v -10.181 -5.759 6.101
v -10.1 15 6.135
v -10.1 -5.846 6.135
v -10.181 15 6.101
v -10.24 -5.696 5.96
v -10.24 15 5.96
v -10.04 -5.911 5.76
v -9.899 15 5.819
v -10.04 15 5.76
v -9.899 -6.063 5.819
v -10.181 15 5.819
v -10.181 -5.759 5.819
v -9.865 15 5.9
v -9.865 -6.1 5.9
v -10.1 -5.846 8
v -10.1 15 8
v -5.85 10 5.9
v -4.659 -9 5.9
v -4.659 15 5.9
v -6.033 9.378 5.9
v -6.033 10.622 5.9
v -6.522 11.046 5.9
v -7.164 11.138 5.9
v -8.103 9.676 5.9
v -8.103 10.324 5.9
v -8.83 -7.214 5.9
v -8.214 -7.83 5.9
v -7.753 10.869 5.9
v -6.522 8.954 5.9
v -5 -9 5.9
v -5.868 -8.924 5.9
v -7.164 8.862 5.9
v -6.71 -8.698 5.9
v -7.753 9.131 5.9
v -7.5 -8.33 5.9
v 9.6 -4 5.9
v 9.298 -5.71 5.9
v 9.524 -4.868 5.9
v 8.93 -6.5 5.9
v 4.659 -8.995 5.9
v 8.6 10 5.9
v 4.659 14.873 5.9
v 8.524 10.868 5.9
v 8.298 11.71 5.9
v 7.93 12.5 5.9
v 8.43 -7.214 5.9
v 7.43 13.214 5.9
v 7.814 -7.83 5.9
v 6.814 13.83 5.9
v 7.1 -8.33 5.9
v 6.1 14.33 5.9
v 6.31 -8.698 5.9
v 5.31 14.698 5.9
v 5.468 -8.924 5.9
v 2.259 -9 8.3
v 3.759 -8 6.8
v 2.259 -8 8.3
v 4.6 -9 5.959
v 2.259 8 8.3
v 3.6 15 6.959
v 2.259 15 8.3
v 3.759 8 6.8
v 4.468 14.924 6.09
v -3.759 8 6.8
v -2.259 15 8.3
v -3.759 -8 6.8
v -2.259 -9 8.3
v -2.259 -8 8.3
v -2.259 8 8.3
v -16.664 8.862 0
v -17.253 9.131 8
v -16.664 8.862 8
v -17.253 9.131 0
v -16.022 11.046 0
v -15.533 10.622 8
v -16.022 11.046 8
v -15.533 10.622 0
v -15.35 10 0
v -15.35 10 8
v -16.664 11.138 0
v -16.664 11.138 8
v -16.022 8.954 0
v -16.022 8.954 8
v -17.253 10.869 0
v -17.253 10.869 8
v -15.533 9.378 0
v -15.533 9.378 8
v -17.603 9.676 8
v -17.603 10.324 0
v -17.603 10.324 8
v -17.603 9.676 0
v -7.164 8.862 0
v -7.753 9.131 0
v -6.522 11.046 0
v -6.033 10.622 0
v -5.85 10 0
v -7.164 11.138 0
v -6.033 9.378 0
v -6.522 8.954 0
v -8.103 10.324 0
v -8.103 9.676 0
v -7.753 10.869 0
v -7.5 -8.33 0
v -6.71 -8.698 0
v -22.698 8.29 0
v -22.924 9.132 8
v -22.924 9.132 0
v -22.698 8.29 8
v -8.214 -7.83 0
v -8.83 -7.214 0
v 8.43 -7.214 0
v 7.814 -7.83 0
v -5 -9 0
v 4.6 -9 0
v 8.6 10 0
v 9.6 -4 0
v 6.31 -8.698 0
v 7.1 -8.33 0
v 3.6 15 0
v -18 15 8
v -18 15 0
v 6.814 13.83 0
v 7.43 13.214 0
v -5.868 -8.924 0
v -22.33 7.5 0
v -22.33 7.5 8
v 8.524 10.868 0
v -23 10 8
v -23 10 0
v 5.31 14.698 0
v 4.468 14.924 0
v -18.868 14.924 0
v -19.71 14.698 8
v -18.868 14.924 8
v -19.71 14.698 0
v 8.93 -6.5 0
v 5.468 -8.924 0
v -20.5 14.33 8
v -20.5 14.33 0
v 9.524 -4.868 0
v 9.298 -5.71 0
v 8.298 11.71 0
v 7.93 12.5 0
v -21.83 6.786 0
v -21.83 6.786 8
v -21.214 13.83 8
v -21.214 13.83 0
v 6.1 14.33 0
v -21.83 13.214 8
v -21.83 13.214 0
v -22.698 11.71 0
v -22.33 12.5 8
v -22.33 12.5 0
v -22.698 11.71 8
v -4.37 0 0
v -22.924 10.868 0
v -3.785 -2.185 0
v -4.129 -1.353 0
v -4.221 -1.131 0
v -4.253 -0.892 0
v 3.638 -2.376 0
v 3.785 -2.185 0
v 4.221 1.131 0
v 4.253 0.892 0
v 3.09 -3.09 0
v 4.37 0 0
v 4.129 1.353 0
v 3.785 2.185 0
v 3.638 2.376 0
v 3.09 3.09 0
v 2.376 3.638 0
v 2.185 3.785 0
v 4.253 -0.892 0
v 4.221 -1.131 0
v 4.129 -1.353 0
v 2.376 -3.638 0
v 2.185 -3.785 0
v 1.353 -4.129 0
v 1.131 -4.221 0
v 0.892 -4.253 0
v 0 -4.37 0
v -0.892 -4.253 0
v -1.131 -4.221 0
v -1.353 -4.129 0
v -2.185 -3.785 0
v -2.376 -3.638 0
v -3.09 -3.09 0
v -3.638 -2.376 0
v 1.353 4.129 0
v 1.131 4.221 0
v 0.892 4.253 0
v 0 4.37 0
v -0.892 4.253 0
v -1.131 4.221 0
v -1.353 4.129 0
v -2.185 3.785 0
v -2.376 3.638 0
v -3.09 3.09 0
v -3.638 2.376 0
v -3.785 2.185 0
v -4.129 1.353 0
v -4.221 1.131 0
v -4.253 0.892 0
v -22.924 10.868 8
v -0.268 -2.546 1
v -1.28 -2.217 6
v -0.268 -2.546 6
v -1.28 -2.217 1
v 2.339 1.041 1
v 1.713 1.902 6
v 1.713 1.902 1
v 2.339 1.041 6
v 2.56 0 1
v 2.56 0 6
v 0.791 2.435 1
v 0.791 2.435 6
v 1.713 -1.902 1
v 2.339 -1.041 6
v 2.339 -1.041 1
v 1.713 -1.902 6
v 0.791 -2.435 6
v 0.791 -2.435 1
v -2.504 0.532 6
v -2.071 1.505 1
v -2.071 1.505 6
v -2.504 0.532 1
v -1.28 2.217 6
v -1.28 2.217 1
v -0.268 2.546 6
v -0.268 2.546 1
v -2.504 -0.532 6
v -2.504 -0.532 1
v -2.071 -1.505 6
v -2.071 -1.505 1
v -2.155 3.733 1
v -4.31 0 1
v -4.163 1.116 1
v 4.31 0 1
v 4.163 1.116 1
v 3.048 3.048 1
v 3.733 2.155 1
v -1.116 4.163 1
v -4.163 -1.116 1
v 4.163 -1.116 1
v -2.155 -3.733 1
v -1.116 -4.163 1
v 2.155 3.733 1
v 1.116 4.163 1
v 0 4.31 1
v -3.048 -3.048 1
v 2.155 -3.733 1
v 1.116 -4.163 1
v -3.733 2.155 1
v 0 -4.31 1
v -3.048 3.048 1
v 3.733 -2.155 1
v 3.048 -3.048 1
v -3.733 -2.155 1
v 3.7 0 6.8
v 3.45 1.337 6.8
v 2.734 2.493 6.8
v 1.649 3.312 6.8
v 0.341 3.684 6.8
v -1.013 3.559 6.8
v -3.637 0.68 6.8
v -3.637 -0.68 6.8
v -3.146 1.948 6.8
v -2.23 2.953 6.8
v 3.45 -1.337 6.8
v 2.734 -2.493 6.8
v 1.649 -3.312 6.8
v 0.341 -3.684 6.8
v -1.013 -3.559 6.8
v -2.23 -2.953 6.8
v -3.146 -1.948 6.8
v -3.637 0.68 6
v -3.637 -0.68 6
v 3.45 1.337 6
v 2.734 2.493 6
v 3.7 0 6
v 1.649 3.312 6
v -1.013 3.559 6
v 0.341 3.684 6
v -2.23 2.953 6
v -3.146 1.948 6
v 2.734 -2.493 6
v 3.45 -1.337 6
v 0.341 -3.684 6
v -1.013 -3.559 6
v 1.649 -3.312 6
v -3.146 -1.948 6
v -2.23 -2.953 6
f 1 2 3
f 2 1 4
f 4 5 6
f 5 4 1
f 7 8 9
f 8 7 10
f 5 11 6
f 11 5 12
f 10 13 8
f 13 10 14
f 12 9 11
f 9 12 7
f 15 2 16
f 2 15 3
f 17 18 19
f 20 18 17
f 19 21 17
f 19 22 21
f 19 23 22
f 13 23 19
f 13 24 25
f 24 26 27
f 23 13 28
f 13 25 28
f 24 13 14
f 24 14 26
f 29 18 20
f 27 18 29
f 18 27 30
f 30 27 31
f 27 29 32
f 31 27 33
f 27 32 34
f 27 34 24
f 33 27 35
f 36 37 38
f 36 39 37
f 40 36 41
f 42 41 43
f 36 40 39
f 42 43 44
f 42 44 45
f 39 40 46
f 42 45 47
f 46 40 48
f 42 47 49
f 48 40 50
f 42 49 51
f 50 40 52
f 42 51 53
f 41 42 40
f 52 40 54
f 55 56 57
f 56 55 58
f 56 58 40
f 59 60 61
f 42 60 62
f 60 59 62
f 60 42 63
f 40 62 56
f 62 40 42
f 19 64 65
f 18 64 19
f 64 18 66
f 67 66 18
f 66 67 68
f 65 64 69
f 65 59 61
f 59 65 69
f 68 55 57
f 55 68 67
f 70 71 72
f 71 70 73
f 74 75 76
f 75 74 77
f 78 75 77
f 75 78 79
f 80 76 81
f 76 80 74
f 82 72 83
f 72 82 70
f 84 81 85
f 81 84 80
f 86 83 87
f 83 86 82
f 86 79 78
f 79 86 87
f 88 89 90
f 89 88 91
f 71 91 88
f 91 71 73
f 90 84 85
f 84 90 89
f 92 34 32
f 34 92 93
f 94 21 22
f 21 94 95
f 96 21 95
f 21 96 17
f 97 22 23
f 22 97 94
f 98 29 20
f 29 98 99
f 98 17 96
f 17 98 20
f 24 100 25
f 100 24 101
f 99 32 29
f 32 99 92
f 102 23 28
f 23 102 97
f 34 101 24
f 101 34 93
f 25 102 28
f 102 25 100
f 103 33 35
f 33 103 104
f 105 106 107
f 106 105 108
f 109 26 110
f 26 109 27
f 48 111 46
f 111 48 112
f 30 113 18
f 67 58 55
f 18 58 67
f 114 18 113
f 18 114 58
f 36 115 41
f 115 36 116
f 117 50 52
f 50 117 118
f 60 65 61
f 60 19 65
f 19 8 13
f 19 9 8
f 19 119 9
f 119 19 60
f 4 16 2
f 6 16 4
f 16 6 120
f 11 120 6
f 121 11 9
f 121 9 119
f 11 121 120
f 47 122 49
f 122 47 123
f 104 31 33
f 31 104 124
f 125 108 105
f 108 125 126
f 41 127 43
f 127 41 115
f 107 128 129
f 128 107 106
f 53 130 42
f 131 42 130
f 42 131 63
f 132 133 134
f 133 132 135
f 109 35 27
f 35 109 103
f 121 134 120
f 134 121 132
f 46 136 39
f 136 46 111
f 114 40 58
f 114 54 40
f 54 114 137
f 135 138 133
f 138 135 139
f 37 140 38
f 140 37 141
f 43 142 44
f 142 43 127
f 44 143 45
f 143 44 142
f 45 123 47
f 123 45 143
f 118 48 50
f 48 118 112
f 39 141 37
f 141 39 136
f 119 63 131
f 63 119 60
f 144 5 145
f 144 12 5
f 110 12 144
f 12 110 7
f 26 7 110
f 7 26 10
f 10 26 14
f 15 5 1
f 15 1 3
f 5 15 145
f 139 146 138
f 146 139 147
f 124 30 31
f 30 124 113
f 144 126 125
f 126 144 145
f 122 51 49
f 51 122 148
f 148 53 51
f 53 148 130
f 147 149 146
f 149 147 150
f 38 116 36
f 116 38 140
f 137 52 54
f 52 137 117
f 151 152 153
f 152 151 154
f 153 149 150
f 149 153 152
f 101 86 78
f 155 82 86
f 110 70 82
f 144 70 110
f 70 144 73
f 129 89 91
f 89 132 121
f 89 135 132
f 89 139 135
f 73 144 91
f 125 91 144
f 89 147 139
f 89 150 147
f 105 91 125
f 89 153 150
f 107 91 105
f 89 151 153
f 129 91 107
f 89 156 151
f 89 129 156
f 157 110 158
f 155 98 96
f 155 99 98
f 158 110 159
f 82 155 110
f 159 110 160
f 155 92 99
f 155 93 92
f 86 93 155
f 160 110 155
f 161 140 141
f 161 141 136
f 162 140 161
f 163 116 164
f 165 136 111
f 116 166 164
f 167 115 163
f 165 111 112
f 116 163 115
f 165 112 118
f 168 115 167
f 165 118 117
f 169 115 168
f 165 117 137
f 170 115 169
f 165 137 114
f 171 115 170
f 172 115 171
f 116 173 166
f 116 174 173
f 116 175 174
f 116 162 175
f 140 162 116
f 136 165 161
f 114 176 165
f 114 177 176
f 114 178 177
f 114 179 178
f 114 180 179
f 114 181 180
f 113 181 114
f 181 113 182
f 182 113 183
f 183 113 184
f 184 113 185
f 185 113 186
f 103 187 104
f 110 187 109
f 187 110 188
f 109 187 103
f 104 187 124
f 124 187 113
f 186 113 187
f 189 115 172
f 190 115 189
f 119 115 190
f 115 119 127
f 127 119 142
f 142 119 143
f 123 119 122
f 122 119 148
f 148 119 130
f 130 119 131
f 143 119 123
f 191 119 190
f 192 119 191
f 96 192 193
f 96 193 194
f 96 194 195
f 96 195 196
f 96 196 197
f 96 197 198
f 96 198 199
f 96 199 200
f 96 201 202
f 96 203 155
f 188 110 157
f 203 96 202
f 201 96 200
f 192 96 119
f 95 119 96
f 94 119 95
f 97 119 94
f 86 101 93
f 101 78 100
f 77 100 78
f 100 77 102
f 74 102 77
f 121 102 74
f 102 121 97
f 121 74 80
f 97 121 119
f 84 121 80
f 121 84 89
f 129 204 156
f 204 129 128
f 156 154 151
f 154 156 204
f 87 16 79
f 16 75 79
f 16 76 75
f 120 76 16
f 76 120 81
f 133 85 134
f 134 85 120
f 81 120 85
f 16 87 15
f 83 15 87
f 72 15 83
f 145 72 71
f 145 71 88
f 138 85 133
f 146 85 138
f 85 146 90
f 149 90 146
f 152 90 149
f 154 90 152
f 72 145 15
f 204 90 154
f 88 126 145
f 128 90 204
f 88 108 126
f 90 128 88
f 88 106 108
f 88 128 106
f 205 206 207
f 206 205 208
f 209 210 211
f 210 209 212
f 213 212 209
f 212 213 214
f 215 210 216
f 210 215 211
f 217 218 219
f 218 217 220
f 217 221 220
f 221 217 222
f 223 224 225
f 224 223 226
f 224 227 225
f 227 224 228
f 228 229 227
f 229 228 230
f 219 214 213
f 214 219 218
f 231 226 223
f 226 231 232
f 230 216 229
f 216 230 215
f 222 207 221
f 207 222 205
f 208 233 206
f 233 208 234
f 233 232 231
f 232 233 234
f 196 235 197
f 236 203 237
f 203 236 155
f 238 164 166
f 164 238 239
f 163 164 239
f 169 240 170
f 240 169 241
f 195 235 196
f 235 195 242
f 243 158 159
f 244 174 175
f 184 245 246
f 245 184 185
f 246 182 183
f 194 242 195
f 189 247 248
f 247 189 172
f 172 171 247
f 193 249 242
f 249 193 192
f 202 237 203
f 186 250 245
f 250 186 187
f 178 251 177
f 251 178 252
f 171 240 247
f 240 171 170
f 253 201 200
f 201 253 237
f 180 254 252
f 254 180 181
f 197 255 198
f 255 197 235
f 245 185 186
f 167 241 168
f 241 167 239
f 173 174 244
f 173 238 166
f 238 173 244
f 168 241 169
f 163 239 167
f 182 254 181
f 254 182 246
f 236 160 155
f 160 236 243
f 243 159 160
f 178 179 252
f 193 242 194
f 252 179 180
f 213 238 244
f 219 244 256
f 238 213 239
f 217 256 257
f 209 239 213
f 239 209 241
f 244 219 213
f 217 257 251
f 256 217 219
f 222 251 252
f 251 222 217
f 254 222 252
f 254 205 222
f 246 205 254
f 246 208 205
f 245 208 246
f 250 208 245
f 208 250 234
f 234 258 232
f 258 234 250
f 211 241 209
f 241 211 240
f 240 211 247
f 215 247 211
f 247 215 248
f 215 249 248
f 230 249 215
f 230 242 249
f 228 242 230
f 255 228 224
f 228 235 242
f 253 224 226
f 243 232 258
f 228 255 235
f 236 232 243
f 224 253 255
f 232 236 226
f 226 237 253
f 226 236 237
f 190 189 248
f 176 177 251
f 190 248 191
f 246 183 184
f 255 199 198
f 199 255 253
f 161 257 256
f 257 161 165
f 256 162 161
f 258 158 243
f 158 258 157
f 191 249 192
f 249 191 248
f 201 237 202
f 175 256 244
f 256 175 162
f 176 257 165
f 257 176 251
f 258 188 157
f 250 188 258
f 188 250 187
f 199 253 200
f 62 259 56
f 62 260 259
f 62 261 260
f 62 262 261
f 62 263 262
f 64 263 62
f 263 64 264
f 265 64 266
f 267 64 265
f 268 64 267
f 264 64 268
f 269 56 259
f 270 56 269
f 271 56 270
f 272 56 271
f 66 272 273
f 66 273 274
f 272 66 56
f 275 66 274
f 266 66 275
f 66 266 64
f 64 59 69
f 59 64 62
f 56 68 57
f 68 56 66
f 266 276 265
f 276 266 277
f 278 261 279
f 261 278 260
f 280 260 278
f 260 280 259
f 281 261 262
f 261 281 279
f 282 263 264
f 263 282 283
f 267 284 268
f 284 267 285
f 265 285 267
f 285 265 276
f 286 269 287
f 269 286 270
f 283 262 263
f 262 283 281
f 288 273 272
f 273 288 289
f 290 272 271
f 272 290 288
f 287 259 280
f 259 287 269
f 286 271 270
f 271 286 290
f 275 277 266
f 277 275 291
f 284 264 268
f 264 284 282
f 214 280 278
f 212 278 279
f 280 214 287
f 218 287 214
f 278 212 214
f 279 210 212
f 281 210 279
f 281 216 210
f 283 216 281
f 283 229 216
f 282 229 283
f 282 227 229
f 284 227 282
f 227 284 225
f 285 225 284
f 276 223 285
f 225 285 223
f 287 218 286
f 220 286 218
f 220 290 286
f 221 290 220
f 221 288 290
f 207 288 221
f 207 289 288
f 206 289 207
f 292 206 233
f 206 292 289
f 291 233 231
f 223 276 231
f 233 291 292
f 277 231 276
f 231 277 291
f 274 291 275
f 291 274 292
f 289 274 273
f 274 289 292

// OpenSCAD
// file: ext20v.scad
// cut-out model to fit Openbuilds V-Slot 20mm extrusion

// fuzz is -1/2 kerf for a laser cutter,
// or the amount of extrusion spread for a 3D printer

module slotV(len,fuzz,verbose) {
// center of square cylinder for V cut-out is 1mm outside of extrusion.
// outside border of extrusion is 1.9mm.  inner slot width is 6.35mm, but
// corners are beveled, so ideal corner would be less
// 1/2 slot width is the same dist as sr-(1+1.9), hence
sr = 1+1.9+(6.2/2);
  difference() {
    // having testing trouble.  I don't want to worry about v-slot tab yet.
    // make it extra small until I'm really ready to tweak it (remove -.3)
    translate([-10-1,0,0]) cylinder(r=sr-fuzz*sqrt(2)-.3,h=len,$fn=4);
    translate([-8+.3+4/2,0,len/2]) cube([4,7,len],center=true);  // arbitrary .3mm extra lip to tab
  }

  // actual slot profile
  if(verbose % 2) %hull() {
    translate([-10+2+1.2/2,0,len/2]) cube([1.2,10.6,len],center=true);
    translate([-5,0,len/2]) cube([2,4,len],center=true);
  }
}

module ext20(len,fuzz=0,verbose=3) {
w=20+2*fuzz;
w2f = w/2 - 0.6*abs(fuzz);  // offset to center of corner stress relief loop
rc = (abs(fuzz) < 0.1) ? 0.2 : 2*abs(fuzz);  // radius of corner releif loop
ro=1;
$fn=24;
  difference() {
    union() {
      translate([0,0,len/2]) cube([w,w,len],center=true);
      for(i=[-1,1]) for(j=[-1,1]) // extra clearance around corners
        translate([w2f*i,w2f*j,0]) cylinder(r=rc,h=len,$fn=8);
    }

    translate([0,0,-1]) {
      for (a=[0,90,180,270]) {
        rotate([0,0,a])
          slotV(len+2,fuzz,verbose);
      }
      if (floor(verbose/2) % 2) %cylinder(r=2,h=len+2);
    }
  }
}

if (0) { // notional display
  translate([0,0,4]) ext20(5,0.2);
  ext20(5,0);
  translate([0,0,-4]) ext20(5,-0.2);
} else {
  // quality of fit cutout test cut/print
  projection(cut=true)
  difference() {
    cube([30,30,10],center=true);
    translate([0,0,-12/2]) ext20(12,-0.15); // quelab laser cutter
  }
}
// file: microswitch.scad
// Don't print this file, purchase real micro switches
// e.g. Honeywell ZM10B10A01 or OMRON SS-5 or similar.

module microswitchHoles() {
  for (x = [-9.5/2, 9.5/2]) {
    translate([x, 0, 0]) rotate([90, 0, 0])
      cylinder(r=2.5/2, h=20, center=true, $fn=12);
  }
}

module microswitch() {
  difference() {
    union() {
      translate([0, 0, 2.5])
        cube([19.8, 6, 10], center=true);
      translate([2.5, 0.5, 6])
        cube([2, 3.5, 5], center=true);
      for (x = [-8, -1, 8]) {
        translate([x, 0, 0])
          cube([0.6, 3.2, 13], center=true);
      }
    }
    microswitchHoles();
  }
}

module microswitchGuide() {
  intersection() {
    difference() {
      hull() {
        translate([-6,0,0]) cylinder(r=4,h=2,$fn=24);
        translate([ 6,0,0]) cylinder(r=4,h=2,$fn=24);
        translate([ 2.4,8,0]) scale([2,1,1]) cylinder(r=3,h=2,$fn=36);
      }
      translate([0,0,-1]) rotate([-90,0,0]) microswitchHoles();
    }
    translate([2.4,8,-1]) microswitchGuideSlot();
  }
}

// little slot to help glide probe handle on top of switch
module microswitchGuideSlot() {
  difference() {
    union() {
      translate([-4.6,0.5,0]) cylinder(h=4,r=4,$fn=36);
      translate([ 4.6,0.5,0]) cylinder(h=4,r=4,$fn=36);
      hull() {
        translate([-15,-13,0]) cube([25,1,4]);
        translate([-11, -1,0]) cube([18,1,4]);
      }
    }
    cylinder(h=15,r=.6,$fn=18,center=true);
  }
}


%microswitch();

translate([0,-20,-1]) {
   rotate([-90,0,0]) %microswitch();
   //projection(cut=true)
     microswitchGuide();
}
// main file
use <microswitch.scad>;
use <ext20v.scad>;

m5rad = 4.92/2;//4.88/2;
m5_head_radius = 8.62/2;//8.5/2;  // 5mm head height, uses 4mm hex drive

module microswitchEndstop20v(fuzz) {
  difference() {
    hull() {
      translate([4.6,-4,0]) cylinder(h=10,r=5,$fn=36);
      translate([ -5,-4,0]) cylinder(h=10,r=5,$fn=36);
      translate([3.6,10,0]) cylinder(h=10,r=5,$fn=36);
      translate([-18,10,0]) cylinder(h=10,r=5,$fn=36);
    }

    translate([0,16,10+6]) rotate([90,0,0]) ext20(30,fuzz,verbose=0);
    translate([-26,-12,8]) cube([20,30,8]);

    // 5mm bolt hole
    cylinder(r=m5rad+fuzz,h=11,$fn=15);
    translate([0,0,-4])
       cylinder(r2=m5_head_radius,r1=m5_head_radius+.3,h=5,$fn=24);

    // 2.4mm diam was good for M2.5.  go a little smaller for #2
    translate([-16.5,10,-1]) for(a=[0,1])
       translate([9.5*a,0,-1]) cylinder(r=2.3/2, h=11, $fn=11);

    // extra clearance for extrusion nut
    translate([0,0,8.8]) cube([10,16,4],center=true);
    translate([0,0,6  ]) cylinder(r=3.5+.2,h=4,$fn=17);
  }

  %translate([-9.5/2-7,10,-3]) rotate([-90,0,0]) microswitch();
}

microswitchEndstop20v(.1);

// support (not helpful with current shallow countersink... just clean up with drill bit)
%color("Cyan") {
  difference() {
    cylinder(h=.8,r=3.5,$fn=10);
    translate([0,0,-1]) cylinder(h=7,r=3.2,$fn=10);
  }
}
